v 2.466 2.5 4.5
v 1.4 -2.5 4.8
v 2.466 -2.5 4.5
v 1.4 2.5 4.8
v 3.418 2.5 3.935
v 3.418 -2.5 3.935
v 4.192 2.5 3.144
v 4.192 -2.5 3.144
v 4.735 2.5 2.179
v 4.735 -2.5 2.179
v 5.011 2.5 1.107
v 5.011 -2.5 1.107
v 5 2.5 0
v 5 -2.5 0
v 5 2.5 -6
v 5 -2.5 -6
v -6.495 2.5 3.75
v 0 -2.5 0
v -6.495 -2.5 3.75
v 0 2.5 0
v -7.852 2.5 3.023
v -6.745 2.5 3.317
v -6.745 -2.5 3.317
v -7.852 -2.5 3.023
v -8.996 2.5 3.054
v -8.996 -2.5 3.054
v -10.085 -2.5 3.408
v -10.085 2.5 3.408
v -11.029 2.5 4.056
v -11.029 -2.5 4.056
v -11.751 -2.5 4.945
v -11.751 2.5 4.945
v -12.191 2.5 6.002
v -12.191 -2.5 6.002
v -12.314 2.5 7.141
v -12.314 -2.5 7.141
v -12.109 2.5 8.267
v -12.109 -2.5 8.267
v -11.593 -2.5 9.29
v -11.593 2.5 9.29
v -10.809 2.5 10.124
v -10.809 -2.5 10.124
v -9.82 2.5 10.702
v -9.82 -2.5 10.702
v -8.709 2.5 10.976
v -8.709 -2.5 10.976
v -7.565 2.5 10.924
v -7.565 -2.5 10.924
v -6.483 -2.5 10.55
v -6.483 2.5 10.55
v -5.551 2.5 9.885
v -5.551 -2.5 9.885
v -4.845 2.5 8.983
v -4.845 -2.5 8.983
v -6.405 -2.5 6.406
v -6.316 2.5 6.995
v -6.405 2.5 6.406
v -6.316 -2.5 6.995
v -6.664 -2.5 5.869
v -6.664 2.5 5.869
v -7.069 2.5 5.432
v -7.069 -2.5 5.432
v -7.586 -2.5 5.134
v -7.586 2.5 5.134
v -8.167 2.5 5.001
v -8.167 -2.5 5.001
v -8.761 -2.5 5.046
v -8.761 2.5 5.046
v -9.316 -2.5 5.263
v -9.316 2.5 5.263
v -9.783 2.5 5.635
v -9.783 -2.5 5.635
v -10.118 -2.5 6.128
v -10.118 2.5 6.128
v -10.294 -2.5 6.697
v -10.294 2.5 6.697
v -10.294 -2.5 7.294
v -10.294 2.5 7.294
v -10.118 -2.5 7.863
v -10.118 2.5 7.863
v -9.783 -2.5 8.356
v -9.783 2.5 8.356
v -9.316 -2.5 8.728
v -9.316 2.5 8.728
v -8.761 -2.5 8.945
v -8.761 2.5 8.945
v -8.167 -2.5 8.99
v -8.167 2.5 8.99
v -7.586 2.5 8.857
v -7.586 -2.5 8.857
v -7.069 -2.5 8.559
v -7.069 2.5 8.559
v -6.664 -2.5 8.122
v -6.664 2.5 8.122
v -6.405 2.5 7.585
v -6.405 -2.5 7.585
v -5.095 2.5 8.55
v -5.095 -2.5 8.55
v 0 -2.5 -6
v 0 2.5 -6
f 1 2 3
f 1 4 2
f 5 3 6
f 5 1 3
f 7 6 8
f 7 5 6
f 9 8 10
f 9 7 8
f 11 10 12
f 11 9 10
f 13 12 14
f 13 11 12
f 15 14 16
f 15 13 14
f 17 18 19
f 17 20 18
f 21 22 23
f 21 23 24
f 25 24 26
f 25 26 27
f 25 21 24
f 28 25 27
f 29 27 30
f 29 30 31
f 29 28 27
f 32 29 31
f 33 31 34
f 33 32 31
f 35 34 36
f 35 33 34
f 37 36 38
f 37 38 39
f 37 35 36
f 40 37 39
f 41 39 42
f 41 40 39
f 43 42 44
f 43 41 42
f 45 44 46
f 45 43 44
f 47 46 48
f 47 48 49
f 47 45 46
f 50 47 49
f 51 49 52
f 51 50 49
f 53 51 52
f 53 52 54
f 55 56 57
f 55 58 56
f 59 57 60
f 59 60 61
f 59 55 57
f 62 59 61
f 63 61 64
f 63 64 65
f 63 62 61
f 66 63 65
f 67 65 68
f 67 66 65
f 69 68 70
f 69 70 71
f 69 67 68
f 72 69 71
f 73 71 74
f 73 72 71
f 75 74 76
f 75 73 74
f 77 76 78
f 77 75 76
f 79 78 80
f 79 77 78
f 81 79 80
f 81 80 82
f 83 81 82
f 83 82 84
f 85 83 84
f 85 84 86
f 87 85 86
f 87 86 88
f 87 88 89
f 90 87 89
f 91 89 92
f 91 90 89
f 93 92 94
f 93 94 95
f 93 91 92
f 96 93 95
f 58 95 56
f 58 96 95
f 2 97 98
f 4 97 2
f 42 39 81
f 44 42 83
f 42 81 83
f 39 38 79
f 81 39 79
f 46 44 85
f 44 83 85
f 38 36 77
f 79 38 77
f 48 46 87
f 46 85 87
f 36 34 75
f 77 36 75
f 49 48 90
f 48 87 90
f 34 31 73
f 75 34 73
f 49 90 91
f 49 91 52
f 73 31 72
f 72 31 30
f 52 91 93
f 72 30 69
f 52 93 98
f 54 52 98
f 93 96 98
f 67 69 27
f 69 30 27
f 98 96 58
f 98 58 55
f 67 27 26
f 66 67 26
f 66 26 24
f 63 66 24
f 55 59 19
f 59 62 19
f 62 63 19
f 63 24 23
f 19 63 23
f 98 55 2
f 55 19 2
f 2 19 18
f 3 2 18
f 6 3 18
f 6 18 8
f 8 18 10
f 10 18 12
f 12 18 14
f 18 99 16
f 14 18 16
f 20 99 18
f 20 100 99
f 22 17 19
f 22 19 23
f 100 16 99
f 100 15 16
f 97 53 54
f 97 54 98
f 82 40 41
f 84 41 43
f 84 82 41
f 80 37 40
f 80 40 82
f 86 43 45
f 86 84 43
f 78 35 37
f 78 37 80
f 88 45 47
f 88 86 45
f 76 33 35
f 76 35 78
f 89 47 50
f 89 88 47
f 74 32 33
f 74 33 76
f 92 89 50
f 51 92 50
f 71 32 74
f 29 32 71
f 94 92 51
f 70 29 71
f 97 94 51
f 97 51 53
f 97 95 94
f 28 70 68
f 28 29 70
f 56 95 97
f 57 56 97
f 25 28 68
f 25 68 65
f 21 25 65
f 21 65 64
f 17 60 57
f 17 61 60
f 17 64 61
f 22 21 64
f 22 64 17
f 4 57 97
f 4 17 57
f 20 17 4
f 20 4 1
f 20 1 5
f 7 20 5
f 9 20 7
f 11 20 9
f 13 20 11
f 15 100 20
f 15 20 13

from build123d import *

# Parameters (mm, degrees)
SKETCH1_R           = 2
BOSS_EXTRUDE2_DEPTH = 2.5


with BuildPart() as part:
    # Sketch1 → Boss-Extrude2 (new body, symmetric)
    with BuildSketch(Plane(origin=(0, 0, 0), x_dir=(1, 0, 0), z_dir=(0, 1, 0))):
        with BuildLine():
            Line((0, 0), (-6.495190528, -3.75))
            Line((-6.495190528, -3.75), (-6.745190528, -3.316987298))
            ThreePointArc((-6.745190528, -3.316987298), (-12.108900988, -8.267189567), (-4.845190528, -8.983012702))
            Line((-4.845190528, -8.983012702), (-5.095190528, -8.55))
            Line((-5.095190528, -8.55), (1.4, -4.8))
            ThreePointArc((1.4, -4.8), (4.191681084, -3.143760813), (5, 0))
            Line((5, 0), (5, 6))
            Line((5, 6), (0, 6))
            Line((0, 6), (0, 0))
        make_face()
        with Locations((-8.316447957, -6.99545846)):
            Circle(SKETCH1_R, mode=Mode.SUBTRACT)
    extrude(amount=BOSS_EXTRUDE2_DEPTH, both=True)


solid = part.part
